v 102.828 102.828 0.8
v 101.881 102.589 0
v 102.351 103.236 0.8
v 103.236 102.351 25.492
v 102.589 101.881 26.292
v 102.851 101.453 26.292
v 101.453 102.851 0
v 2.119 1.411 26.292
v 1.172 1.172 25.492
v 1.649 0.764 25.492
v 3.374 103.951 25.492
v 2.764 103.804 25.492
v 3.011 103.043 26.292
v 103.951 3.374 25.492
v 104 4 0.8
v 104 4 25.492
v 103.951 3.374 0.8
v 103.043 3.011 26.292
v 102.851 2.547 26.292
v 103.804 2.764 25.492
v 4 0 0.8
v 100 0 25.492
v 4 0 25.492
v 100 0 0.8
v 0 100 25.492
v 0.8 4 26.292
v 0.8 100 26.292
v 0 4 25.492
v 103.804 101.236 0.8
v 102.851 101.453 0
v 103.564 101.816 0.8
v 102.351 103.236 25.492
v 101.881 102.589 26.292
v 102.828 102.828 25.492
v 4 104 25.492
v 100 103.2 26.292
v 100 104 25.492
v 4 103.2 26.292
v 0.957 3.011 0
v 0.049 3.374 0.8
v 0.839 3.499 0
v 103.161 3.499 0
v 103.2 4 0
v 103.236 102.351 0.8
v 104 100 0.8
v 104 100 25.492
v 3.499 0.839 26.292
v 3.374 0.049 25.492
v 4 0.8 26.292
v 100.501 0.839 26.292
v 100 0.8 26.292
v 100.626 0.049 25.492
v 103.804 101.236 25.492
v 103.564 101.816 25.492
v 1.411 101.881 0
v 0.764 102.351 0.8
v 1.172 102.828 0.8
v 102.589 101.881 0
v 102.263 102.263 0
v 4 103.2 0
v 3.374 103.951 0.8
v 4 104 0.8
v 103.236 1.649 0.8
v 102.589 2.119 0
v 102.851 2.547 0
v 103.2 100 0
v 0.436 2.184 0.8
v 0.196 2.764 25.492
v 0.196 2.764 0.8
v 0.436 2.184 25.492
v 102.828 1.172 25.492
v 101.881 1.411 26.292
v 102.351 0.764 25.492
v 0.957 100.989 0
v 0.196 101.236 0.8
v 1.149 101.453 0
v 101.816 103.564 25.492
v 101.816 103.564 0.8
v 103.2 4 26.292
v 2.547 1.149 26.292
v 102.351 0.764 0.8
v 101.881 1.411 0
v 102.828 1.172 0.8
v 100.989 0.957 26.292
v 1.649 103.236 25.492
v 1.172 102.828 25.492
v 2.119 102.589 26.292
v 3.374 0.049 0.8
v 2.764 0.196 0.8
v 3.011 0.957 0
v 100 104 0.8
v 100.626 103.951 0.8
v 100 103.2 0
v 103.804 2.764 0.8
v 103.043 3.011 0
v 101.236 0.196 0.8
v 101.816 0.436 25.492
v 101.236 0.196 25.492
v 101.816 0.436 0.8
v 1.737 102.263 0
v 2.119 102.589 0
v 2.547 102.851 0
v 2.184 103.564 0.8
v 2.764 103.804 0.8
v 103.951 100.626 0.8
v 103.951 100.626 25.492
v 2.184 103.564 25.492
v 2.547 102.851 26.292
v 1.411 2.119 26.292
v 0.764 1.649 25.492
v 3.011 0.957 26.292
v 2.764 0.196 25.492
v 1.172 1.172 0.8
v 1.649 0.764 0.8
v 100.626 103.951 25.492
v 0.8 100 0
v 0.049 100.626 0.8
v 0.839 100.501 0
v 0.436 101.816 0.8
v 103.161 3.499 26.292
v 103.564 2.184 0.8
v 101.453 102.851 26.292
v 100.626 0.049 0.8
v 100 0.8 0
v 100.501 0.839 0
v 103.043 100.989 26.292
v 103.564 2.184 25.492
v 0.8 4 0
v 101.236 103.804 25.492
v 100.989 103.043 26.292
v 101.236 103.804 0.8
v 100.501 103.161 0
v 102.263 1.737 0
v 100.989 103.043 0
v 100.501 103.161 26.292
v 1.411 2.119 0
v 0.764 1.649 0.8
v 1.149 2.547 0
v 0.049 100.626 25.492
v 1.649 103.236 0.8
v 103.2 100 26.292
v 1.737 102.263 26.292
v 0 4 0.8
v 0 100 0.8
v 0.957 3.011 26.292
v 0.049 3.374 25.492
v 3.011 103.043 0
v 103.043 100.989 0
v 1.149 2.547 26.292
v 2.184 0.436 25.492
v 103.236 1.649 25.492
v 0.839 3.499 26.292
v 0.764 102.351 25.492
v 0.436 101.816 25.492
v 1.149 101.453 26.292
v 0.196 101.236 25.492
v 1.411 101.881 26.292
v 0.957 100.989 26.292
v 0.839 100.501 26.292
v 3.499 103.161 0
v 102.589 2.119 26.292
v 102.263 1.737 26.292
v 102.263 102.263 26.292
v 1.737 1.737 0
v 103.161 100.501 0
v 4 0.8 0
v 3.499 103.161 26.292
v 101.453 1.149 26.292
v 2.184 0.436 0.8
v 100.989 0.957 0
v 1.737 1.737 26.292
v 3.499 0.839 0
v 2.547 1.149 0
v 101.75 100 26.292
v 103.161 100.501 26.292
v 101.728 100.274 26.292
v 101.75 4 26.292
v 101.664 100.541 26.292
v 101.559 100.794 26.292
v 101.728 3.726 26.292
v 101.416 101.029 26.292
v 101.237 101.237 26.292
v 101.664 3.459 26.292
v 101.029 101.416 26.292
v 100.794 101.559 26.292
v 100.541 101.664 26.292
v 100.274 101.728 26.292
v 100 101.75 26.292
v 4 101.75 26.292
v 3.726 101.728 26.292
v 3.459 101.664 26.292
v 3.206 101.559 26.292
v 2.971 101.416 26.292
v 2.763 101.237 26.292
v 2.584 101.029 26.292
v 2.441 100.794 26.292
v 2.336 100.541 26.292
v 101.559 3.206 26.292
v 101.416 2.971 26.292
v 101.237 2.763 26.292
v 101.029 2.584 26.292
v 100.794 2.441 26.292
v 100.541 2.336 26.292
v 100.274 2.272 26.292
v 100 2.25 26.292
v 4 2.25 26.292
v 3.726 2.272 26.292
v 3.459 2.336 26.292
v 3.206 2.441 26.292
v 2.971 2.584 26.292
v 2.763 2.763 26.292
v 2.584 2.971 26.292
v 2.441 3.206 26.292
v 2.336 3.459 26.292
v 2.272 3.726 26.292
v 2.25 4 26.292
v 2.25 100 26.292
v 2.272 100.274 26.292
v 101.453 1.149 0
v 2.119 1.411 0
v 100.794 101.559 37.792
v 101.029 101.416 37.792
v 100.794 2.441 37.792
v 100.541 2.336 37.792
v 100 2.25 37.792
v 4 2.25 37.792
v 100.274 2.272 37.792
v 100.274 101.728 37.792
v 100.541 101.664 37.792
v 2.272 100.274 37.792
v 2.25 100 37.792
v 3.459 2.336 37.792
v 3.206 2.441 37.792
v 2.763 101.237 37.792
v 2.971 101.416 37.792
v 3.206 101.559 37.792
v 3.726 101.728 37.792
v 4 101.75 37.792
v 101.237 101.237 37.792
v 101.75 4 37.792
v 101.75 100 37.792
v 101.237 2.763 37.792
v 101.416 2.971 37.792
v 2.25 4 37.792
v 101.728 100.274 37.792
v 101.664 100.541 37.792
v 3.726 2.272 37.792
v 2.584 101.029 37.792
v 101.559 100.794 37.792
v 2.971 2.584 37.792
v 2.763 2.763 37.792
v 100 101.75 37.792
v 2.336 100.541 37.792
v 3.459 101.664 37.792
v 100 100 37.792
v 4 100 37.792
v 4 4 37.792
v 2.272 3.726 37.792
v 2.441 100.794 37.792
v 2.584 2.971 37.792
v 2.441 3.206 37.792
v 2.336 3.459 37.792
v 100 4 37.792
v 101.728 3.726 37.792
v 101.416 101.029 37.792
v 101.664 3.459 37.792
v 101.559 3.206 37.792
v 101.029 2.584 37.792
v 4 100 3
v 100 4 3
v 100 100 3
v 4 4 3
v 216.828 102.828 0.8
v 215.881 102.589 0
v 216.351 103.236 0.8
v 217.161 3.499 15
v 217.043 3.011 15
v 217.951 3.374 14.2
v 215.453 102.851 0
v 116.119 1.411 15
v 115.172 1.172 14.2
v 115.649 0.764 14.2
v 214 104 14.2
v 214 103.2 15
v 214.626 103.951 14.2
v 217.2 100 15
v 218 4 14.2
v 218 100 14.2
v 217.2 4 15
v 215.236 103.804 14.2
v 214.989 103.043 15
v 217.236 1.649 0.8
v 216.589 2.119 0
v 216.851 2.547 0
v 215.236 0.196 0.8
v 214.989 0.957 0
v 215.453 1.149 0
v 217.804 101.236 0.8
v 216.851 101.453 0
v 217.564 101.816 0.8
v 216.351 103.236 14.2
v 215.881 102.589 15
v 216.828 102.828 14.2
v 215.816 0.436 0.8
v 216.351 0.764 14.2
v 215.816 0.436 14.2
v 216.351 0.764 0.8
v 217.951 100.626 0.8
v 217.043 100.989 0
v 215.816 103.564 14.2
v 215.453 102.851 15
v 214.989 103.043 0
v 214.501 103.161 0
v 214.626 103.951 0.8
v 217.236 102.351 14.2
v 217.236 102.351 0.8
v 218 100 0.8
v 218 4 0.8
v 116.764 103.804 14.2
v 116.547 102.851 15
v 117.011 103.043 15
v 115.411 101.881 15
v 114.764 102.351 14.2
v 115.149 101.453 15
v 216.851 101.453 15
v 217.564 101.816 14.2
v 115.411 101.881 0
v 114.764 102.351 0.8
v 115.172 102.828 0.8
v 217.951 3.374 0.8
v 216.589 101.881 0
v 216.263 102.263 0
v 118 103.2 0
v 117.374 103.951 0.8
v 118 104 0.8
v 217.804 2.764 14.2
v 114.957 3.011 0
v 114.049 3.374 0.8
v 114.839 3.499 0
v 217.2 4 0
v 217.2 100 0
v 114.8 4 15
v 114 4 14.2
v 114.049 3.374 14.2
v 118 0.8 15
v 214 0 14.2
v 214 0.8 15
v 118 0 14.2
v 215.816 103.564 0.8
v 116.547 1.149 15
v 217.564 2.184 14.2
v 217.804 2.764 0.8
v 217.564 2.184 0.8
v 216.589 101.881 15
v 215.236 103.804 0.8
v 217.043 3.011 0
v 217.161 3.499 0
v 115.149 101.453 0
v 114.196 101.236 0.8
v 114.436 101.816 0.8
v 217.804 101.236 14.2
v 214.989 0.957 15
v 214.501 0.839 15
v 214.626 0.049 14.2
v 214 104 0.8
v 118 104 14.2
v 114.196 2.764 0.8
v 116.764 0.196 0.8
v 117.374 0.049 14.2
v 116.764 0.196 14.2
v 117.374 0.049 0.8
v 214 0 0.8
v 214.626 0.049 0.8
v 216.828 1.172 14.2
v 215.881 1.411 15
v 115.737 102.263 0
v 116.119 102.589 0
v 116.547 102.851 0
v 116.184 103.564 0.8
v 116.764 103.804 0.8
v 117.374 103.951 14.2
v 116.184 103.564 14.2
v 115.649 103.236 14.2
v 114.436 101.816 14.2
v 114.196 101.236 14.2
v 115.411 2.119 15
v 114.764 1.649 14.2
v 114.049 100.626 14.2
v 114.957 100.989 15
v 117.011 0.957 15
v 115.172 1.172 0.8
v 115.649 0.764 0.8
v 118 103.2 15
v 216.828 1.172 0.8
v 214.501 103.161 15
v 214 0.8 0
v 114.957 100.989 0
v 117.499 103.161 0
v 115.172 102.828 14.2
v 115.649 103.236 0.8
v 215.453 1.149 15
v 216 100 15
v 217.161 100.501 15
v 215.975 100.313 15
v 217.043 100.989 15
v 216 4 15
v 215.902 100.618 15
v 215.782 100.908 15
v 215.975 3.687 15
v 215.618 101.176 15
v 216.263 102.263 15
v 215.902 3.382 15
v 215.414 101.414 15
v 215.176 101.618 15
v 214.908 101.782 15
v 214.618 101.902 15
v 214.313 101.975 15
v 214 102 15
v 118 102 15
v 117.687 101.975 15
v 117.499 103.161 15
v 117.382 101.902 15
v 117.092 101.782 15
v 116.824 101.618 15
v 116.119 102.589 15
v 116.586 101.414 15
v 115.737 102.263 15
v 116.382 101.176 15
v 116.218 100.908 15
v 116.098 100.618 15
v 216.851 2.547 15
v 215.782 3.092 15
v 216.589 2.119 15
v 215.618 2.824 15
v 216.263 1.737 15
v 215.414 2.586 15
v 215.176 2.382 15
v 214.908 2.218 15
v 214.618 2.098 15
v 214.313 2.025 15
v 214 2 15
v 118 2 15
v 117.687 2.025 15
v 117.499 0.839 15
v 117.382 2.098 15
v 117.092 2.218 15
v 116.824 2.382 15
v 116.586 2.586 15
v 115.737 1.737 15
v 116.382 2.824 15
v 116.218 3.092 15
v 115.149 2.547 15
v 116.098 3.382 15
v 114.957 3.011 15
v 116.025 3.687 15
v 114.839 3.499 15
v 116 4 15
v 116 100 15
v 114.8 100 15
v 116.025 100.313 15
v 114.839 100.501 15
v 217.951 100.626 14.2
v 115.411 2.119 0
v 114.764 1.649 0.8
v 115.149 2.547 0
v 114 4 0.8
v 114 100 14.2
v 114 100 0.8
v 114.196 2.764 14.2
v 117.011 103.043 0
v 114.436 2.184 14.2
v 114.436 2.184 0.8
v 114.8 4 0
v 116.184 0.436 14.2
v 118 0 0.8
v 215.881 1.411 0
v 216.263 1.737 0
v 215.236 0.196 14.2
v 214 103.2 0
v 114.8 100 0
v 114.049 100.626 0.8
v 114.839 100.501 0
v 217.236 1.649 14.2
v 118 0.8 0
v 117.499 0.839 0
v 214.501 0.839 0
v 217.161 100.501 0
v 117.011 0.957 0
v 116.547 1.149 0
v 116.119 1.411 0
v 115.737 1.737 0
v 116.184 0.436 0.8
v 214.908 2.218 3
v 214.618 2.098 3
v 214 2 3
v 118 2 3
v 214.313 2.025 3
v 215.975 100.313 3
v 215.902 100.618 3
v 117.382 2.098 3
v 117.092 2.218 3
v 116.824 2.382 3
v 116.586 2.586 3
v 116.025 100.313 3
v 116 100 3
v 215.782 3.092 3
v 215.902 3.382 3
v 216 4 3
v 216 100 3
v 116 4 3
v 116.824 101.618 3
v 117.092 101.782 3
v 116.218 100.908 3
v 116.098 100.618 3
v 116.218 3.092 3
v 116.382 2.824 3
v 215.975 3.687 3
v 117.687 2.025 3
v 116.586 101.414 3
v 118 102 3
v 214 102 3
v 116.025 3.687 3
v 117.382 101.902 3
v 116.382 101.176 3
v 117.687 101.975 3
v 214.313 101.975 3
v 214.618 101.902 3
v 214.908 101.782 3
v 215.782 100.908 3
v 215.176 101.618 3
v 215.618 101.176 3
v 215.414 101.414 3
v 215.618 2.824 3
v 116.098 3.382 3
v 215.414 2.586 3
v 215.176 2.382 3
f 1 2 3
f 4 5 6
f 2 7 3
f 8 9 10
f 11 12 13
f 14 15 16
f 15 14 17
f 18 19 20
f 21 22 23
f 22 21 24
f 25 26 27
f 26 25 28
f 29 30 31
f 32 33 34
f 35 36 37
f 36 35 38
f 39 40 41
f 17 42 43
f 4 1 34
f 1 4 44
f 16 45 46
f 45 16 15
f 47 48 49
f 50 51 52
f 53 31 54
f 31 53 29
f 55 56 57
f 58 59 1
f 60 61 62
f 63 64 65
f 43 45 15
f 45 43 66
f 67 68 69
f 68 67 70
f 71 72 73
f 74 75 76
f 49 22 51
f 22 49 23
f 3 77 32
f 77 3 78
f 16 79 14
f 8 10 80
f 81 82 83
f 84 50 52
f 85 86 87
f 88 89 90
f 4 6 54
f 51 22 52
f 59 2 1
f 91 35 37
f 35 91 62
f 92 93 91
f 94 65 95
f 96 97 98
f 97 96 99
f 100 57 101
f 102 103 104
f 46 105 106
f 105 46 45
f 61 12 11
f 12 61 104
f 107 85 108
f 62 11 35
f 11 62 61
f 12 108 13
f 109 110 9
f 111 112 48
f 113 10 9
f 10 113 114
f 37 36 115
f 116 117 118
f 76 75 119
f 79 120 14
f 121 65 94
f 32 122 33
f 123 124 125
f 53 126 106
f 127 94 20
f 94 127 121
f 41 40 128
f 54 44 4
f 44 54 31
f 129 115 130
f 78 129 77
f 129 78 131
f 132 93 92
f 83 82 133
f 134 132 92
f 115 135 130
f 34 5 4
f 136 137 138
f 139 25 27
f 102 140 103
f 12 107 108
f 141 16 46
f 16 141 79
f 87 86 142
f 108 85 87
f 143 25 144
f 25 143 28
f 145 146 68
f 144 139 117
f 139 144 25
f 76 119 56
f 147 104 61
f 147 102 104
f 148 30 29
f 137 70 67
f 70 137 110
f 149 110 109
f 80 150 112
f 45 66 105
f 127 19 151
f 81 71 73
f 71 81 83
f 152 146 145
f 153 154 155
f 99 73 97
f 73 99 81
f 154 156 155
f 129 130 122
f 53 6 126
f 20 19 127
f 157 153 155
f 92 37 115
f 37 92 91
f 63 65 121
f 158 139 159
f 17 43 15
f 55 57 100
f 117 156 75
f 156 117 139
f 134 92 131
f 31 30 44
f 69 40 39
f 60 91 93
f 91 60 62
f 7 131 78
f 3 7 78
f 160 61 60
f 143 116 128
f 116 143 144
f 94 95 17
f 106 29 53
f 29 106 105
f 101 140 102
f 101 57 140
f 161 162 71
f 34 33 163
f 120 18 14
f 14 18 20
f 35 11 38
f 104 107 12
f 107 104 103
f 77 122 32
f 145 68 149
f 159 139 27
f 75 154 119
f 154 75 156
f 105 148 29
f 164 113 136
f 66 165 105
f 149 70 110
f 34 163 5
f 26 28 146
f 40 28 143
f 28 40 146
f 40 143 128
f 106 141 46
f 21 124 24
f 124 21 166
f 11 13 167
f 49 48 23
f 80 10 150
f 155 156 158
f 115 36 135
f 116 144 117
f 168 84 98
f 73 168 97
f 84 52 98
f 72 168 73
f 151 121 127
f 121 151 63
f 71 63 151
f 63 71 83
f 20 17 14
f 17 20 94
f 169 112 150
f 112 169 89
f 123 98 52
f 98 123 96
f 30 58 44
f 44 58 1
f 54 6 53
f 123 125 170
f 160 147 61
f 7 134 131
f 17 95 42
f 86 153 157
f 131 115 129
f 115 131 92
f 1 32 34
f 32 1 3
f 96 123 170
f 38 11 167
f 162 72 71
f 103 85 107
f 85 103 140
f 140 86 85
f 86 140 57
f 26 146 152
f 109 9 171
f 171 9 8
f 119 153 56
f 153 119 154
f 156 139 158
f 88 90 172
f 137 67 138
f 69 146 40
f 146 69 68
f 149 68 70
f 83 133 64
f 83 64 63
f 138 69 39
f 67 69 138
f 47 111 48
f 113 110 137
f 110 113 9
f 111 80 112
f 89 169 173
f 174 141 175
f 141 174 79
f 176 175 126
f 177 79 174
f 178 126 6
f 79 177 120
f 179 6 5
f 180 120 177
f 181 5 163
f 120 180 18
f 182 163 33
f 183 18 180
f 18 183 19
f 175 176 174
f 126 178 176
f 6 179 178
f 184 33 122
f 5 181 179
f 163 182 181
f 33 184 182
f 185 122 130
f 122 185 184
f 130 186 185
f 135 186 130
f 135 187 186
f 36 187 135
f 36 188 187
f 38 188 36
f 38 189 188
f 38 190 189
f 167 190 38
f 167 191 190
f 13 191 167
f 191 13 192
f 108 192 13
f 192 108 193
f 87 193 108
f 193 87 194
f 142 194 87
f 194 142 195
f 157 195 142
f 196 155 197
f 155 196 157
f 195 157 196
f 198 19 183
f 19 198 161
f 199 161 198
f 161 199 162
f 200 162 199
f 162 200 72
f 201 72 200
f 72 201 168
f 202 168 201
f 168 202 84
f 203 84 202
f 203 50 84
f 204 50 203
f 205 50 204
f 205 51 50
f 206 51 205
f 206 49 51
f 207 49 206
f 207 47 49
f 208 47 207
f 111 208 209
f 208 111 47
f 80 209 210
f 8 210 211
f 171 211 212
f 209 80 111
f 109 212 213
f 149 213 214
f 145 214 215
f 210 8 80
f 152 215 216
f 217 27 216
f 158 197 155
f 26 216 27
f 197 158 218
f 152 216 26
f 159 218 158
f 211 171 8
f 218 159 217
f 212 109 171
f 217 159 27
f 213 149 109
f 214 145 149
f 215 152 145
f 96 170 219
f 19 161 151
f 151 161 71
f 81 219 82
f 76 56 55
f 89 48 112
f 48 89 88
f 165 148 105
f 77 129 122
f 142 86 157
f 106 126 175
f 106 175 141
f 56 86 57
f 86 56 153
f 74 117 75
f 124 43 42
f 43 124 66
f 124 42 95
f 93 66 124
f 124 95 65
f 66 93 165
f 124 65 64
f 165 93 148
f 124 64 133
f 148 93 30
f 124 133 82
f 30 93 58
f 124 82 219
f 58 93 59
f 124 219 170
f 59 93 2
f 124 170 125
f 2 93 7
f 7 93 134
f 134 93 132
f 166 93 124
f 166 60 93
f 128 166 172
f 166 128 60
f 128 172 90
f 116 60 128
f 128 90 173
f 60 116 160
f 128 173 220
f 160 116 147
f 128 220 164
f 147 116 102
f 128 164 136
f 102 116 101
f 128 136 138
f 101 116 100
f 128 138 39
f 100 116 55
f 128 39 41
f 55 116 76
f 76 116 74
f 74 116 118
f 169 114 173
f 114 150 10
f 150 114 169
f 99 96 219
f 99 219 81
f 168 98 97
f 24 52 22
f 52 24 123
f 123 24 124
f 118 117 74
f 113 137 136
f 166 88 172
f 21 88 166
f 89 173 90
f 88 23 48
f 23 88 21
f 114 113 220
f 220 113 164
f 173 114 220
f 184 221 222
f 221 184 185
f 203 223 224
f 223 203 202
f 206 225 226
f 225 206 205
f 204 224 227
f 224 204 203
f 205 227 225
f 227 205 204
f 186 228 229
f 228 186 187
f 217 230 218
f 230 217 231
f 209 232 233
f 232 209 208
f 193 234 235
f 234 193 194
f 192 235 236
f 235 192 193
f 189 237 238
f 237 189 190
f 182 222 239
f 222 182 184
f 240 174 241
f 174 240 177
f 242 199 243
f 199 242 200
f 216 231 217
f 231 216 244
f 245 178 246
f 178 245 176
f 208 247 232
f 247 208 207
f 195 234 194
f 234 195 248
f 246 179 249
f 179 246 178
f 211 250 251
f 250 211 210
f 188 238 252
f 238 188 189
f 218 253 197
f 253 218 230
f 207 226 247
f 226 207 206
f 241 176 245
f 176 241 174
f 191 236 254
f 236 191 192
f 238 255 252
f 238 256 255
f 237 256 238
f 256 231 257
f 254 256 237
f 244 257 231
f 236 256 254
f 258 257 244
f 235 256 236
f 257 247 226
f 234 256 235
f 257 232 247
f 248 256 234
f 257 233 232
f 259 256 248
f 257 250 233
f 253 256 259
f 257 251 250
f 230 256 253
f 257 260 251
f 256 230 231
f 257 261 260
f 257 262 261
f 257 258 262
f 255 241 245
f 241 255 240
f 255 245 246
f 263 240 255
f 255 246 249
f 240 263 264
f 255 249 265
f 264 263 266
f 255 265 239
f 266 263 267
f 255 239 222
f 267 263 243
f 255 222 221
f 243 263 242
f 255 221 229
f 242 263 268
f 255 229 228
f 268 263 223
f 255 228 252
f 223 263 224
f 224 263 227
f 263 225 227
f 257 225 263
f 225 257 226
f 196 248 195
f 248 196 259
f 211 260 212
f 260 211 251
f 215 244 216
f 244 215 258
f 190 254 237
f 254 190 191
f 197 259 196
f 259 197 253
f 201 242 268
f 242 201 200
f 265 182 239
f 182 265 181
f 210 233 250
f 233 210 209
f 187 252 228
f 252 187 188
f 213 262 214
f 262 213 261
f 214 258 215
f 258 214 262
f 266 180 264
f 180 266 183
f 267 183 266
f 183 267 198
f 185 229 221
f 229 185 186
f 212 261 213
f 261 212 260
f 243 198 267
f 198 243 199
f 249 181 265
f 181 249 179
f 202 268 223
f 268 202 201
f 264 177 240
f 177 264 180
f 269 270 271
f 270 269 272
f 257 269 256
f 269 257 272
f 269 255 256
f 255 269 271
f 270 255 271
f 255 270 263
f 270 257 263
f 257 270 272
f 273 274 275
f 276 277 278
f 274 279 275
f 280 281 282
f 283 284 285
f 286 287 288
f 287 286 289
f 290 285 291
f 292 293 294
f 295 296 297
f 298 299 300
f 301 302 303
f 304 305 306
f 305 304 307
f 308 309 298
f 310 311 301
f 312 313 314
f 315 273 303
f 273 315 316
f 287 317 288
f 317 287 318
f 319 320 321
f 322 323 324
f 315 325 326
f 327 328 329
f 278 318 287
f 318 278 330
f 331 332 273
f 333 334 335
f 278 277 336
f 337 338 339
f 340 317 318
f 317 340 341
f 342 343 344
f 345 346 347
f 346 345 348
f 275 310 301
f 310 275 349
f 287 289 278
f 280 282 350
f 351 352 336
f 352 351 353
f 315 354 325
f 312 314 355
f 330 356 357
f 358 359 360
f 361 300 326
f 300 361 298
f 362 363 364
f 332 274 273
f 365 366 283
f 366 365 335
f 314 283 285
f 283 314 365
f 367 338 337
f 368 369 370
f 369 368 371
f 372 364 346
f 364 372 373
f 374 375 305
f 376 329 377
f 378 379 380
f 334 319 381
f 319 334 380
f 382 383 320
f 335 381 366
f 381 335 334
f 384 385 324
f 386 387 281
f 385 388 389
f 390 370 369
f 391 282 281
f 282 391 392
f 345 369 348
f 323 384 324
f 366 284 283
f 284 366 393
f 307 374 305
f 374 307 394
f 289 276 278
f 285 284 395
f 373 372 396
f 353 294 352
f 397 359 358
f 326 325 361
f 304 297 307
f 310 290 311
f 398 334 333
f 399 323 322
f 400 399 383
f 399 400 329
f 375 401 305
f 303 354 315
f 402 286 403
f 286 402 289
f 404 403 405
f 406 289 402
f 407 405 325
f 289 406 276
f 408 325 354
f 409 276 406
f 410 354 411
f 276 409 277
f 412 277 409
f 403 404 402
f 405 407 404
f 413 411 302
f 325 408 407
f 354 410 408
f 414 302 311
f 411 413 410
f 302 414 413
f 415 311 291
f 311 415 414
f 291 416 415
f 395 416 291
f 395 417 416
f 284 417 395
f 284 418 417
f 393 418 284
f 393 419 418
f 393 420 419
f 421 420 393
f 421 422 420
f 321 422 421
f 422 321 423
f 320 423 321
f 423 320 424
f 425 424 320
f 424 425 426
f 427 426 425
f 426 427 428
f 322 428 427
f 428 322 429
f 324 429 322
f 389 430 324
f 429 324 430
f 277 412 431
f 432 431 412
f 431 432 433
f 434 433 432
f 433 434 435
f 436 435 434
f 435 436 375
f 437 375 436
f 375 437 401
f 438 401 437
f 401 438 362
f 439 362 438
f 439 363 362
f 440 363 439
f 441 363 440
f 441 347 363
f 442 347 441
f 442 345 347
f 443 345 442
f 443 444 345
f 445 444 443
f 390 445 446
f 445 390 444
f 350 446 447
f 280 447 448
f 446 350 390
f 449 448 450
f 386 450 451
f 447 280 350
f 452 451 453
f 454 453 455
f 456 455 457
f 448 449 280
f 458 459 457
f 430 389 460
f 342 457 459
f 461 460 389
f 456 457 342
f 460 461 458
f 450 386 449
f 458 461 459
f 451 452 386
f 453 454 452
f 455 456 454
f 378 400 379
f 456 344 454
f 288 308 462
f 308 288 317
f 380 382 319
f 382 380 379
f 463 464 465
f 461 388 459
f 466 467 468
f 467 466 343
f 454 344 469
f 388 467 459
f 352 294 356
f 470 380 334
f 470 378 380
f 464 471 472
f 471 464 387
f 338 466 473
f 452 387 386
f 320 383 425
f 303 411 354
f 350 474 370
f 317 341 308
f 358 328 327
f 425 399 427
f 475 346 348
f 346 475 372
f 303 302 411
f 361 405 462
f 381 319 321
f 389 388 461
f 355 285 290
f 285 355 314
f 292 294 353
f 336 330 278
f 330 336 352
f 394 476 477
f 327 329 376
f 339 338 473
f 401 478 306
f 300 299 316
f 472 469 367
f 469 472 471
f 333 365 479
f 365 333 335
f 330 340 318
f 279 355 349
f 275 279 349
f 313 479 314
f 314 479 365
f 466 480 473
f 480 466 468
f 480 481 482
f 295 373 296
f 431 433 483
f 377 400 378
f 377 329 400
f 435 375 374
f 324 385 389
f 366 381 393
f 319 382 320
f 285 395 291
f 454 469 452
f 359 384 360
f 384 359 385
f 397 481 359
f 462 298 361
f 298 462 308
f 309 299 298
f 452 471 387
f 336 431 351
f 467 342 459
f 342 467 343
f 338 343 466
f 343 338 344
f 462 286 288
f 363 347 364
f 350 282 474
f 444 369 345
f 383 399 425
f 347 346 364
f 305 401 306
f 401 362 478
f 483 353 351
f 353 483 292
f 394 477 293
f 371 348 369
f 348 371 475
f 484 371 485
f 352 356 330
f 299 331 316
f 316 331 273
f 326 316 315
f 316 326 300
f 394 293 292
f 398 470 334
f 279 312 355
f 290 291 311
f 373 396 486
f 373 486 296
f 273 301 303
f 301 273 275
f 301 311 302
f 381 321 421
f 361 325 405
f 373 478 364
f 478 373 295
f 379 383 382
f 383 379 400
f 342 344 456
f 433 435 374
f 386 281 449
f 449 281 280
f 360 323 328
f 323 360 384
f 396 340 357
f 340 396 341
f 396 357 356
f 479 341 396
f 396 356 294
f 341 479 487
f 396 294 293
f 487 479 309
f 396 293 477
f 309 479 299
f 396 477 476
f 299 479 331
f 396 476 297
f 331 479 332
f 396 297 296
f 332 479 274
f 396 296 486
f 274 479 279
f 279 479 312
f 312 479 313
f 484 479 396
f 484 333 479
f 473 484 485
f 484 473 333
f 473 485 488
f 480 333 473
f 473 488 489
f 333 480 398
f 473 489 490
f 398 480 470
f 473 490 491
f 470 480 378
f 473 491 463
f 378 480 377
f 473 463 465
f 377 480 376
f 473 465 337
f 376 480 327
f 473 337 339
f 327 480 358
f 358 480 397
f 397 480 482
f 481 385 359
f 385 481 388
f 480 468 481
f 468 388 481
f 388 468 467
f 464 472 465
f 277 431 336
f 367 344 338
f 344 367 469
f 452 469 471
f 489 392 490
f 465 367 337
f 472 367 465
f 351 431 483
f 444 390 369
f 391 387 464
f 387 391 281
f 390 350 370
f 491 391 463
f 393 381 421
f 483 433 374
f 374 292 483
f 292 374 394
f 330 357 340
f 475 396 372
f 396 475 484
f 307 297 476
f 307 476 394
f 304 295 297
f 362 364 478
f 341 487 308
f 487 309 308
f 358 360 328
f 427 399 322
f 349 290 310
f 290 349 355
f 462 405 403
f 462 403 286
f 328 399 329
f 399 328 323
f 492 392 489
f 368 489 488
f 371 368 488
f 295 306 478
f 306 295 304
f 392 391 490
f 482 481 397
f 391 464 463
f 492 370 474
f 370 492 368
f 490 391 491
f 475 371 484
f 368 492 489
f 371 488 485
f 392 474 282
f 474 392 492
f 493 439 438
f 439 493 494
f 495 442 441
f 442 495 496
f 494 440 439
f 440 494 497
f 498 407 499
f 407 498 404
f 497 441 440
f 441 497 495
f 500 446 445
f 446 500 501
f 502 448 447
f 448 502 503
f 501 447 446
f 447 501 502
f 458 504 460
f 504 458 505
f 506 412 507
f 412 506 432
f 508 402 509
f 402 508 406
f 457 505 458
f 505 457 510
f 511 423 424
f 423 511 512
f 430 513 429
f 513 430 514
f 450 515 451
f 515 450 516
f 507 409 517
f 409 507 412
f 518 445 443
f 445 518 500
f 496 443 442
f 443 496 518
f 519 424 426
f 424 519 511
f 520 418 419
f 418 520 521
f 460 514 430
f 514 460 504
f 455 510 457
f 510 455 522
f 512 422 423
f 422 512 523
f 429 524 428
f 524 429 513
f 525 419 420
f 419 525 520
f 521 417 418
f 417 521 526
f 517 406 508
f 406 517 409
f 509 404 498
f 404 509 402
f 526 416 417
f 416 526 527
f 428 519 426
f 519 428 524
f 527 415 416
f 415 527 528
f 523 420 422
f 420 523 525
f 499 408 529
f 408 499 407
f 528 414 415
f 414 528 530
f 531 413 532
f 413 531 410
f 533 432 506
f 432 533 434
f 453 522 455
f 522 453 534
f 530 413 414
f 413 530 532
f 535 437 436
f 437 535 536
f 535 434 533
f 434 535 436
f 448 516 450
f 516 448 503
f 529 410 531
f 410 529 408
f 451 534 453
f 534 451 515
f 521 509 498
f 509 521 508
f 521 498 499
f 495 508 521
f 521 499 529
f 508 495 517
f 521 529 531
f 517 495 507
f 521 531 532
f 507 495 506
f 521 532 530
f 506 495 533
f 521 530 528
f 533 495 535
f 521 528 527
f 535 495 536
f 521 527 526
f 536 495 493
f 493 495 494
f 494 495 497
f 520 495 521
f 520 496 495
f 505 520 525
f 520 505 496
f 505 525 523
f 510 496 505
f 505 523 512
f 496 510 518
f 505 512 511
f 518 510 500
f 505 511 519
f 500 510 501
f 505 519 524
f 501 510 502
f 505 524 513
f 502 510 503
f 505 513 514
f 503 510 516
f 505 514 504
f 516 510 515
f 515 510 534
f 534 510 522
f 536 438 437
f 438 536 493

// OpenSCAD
// file: ../lib/maker_mark.scad
// SPDX-License-Identifier: MIT
// Copyright (c) 2026 KomaSCAD contributors. https://github.com/Kazutadashi/koma-scad
//
// The maker's mark (銘) of the ban, komadai and komabako. Include this file:
//     include <../lib/maker_mark.scad>
// A mark is up to three parts, stacked and centered: an emblem (a koma with a
// character on it), a main line, and a smaller second line. Each line can
// have wide letter spacing, as in a wordmark.
//
// Sizes: size_1 is the main line's text size and size_2 the second line's,
// in mm. maker_mark_sizes() picks them: as large as the room allows, with no
// text below a printable minimum (min_size).

// The emblem's proportions: a koma 1.6 times the main text size tall, as
// wide as a shogi king is for its length.
mark_emblem_height = 1.6;      // times the main text size
mark_emblem_aspect = 0.89;     // width / height
mark_emblem_shoulder = 0.72;   // the shoulders, as a fraction of the height
mark_emblem_inset = 0.37;      // the half-width at the shoulders, as a fraction of the height
mark_emblem_character = 0.5;   // the character's size, as a fraction of the emblem's height
mark_line_gap = 0.55;          // space between the parts, times the main text size
mark_fill = 0.8;               // an automatic mark uses at most this much of its room

// The approximate width of one character, in text sizes. Text has no
// measured width in OpenSCAD 2021, so the mark's size is planned from these.
// OpenSCAD's text size is about the height of a capital, so a character is
// wider than its size: measured in Shippori Mincho and Kaisei Tokumin, a
// Japanese character (from U+2E80) is about 1.35 wide and 1.3 tall, a Latin
// capital about 1 wide (up to 1.2), lower case 0.75, a space 0.35.
function mark_character_width(character) =
    let(code = ord(character))
    code >= 11904 ? 1.35
    : character == " " ? 0.35
    : code >= 65 && code <= 90 ? 1
    : code >= 97 && code <= 122 ? 0.75
    : 0.5;
function mark_text_width(line, i=0) = i >= len(line) ? 0 : mark_character_width(line[i]) + mark_text_width(line, i + 1);
function maker_mark_has_kanji(line) = len([for (character = line) if (ord(character) >= 11904) 1]) > 0;
// The height of a line, in text sizes: taller with Japanese characters.
function mark_line_height(line) = maker_mark_has_kanji(line) ? 1.35 : 1.1;

// The emblem's height: 1.6 times the main text size, but tall enough that its
// character is at least min_size.
function mark_emblem_size(size_1, min_size) = max(size_1*mark_emblem_height, min_size/mark_emblem_character);

// A koma outline, its heel on y = 0 and centered on x = 0.
module mark_koma_2d(height) {
    half = height*mark_emblem_aspect/2;
    polygon([[-half, 0], [half, 0], [height*mark_emblem_inset, height*mark_emblem_shoulder],
             [0, height], [-height*mark_emblem_inset, height*mark_emblem_shoulder]]);
}

// The 2D mark, centered on the origin at the middle of the main line's
// baseline. Empty lines are left out. stroke thickens every stroke by that
// much on each side, so that thin strokes print. min_size keeps the emblem's
// character at least that size.
module maker_mark_2d(line_1, line_2, size_1, size_2, font_1, font_2, spacing_1=1, spacing_2=1,
                     emblem=false, emblem_character="", emblem_font="", stroke=0, min_size=0) {
    gap = size_1*mark_line_gap;
    if (line_1 != "")
        offset(delta=stroke)
            text(line_1, size=size_1, font=font_1, spacing=spacing_1, halign="center", valign="baseline");
    if (line_2 != "")
        translate([0, -gap]) offset(delta=stroke)
            text(line_2, size=size_2, font=font_2, spacing=spacing_2, halign="center", valign="top");
    if (emblem) {
        height = mark_emblem_size(size_1, min_size);
        // The main line's capitals stand about one text size above the baseline.
        translate([0, size_1 + gap]) difference() {
            mark_koma_2d(height);
            if (emblem_character != "")
                translate([0, height*0.42]) offset(delta=stroke)
                    text(emblem_character, size=height*mark_emblem_character,
                         font=emblem_font == "" ? font_1 : emblem_font, halign="center", valign="center");
        }
    }
}

// The space above and below the main line's baseline. Letters stand about
// 1.1 sizes above it and reach about 0.2 below.
function mark_above(size_1, emblem, min_size=0) =
    size_1*1.1 + (emblem ? size_1*mark_line_gap + mark_emblem_size(size_1, min_size) : 0);
function mark_below(line_2, size_1, size_2) =
    size_1*0.2 + (line_2 == "" ? 0 : size_1*mark_line_gap + size_2*mark_line_height(line_2));

// The same mark, with its whole height centered on the origin.
module maker_mark_centered_2d(line_1, line_2, size_1, size_2, font_1, font_2, spacing_1=1, spacing_2=1,
                              emblem=false, emblem_character="", emblem_font="", stroke=0, min_size=0) {
    translate([0, (mark_below(line_2, size_1, size_2) - mark_above(size_1, emblem, min_size))/2])
        maker_mark_2d(line_1, line_2, size_1, size_2, font_1, font_2, spacing_1, spacing_2,
                      emblem, emblem_character, emblem_font, stroke, min_size);
}

// The mark's approximate [width, height] in mm, for fit checks.
function maker_mark_extent(line_1, line_2, size_1, size_2, spacing_1=1, spacing_2=1, emblem=false, min_size=0) =
    [max(mark_text_width(line_1)*size_1*spacing_1, mark_text_width(line_2)*size_2*spacing_2,
         emblem ? mark_emblem_size(size_1, min_size)*mark_emblem_aspect : 0),
     mark_above(size_1, emblem, min_size) + mark_below(line_2, size_1, size_2)];

// The text sizes [size_1, size_2] of a mark. size > 0 sets the main line;
// size = 0 makes it as large as fits mark_fill of room ([width, depth]), up to
// max_size. The second line is ratio times the main line, but never smaller
// than min_size.
function maker_mark_sizes(line_1, line_2, size, ratio, min_size, max_size, spacing_1, spacing_2, emblem, room) =
    let(width_1 = mark_text_width(line_1)*spacing_1,
        width_2 = mark_text_width(line_2)*spacing_2*ratio,
        height = 1.3 + (emblem ? mark_line_gap + mark_emblem_height : 0)
                 + (line_2 == "" ? 0 : mark_line_gap + ratio*mark_line_height(line_2)),
        by_width = room[0]*mark_fill/max(width_1, width_2, emblem ? mark_emblem_height*mark_emblem_aspect : 0, 0.01),
        by_height = room[1]*mark_fill/height,
        size_1 = size > 0 ? size : min(max_size, by_width, by_height),
        size_2 = max(size_1*ratio, min_size))
    [size_1, size_2];

// The size of the smallest text in the lines, or a large number when both are
// empty. The emblem's character grows to min_size by itself.
function maker_mark_smallest_text(line_1, line_2, sizes) =
    min(concat(line_1 != "" ? [sizes[0]] : [], line_2 != "" ? [sizes[1]] : [], [1000]));
// file: ../lib/shapes.scad
// SPDX-License-Identifier: MIT
// Copyright (c) 2026 KomaSCAD contributors. https://github.com/Kazutadashi/koma-scad
//
// Rounded slabs and rings for the ban, komadai and komabako. Include this file:
//     include <../lib/shapes.scad>
// Every shape starts at the origin and grows into +x, +y and +z.

// A rectangle with rounded corners. The radius is limited to half the shorter side.
module rounded_rectangle_2d(size, radius) {
    assert(min(size) > 0, "A rounded rectangle needs a positive width and depth.");
    assert(radius >= 0, "A corner radius cannot be negative.");
    corner = min(radius, min(size)/2);
    if (corner == 0) square(size);
    else translate([corner, corner]) offset(r=corner) square([size[0] - 2*corner, size[1] - 2*corner]);
}

// A slab with rounded vertical corners. size is [width, depth, height].
module rounded_slab(size, radius) {
    assert(size[2] > 0, "A rounded slab needs a positive height.");
    linear_extrude(size[2]) rounded_rectangle_2d([size[0], size[1]], radius);
}

// A rounded slab with a 45 degree chamfer (面取り) round its bottom and top
// edges. A chamfer prints without supports on the bed side of a part.
module chamfered_slab(size, radius, bottom=0, top=0) {
    assert(bottom + top < size[2], "The chamfers are taller than the slab.");
    module layer(z, inset, height) {
        translate([inset, inset, z])
            rounded_slab([size[0] - 2*inset, size[1] - 2*inset, height], max(0, radius - inset));
    }
    thin = 0.01;
    hull() {
        layer(0, bottom, thin);
        layer(bottom, 0, size[2] - bottom - top);
        layer(size[2] - thin, top, thin);
    }
}

// The band between a rounded rectangle and the same shape wall mm smaller on each side.
module rounded_ring_2d(size, wall, radius) {
    assert(wall > 0 && 2*wall < min(size), "The ring wall does not fit inside the ring.");
    difference() {
        rounded_rectangle_2d(size, radius);
        translate([wall, wall]) rounded_rectangle_2d([size[0] - 2*wall, size[1] - 2*wall], max(0, radius - wall));
    }
}
// file: ../lib/filaments.scad
// SPDX-License-Identifier: MIT
// Copyright (c) 2026 KomaSCAD contributors. https://github.com/Kazutadashi/koma-scad
//
// The named filaments of every module. Include this file:
//     include <../lib/filaments.scad>
// A Customizer list of filaments must name these entries, and can add Custom.

// [name, [red, green, blue, opacity]], each channel from 0 to 1.
filament_palette = [
    ["Wood", [0.76, 0.58, 0.34, 1]],   ["Black", [0.08, 0.06, 0.04, 1]],
    ["White", [0.95, 0.95, 0.95, 1]],  ["Red", [0.65, 0.05, 0.04, 1]],
    ["Blue", [0.08, 0.25, 0.8, 1]],    ["Green", [0.08, 0.5, 0.2, 1]],
    ["Purple", [0.45, 0.15, 0.65, 1]], ["Yellow", [0.95, 0.8, 0.08, 1]],
    ["Orange", [0.95, 0.35, 0.05, 1]], ["Silver", [0.7, 0.72, 0.75, 1]],
    ["Gold", [0.8, 0.62, 0.2, 1]],     ["Glitter silver", [0.7, 0.72, 0.75, 1]],
    ["Glitter gold", [0.8, 0.62, 0.2, 1]],
    ["Filament 1", [0.5, 0.5, 0.5, 1]], ["Filament 2", [0.15, 0.5, 0.85, 1]], ["Filament 3", [0.85, 0.25, 0.5, 1]],
    // The colors of the traditional woods: kaya (榧) for boards and komadai, island
    // mulberry (桑) and black persimmon (黒柿) for boxes. Colors only: no grain.
    ["Kaya", [0.86, 0.72, 0.47, 1]],   ["Kuwa", [0.66, 0.45, 0.23, 1]],
    ["Kurogaki", [0.23, 0.18, 0.14, 1]]
];

// The color of a named filament. Custom gives custom_rgba.
function filament_rgba(name, custom_rgba) =
    let(found = [for (entry = filament_palette) if (entry[0] == name) entry[1]])
    name == "Custom" ? custom_rgba
    : assert(len(found) == 1, str("Unknown filament: ", name)) found[0];
// main file
// SPDX-License-Identifier: MIT
// Copyright (c) 2026 KomaSCAD contributors. https://github.com/Kazutadashi/koma-scad
//
// KomaSCAD komabako: a box with a lid for a set of pieces. Tested with OpenSCAD 2021.01.
// The default settings make an inro-lid box for the 40 pieces of a shogi set.
// Units are mm unless a comment says otherwise.
// Guide and every setting: docs/komabako.md.
// Keep ../lib/ next to this file's folder.

/* [01 - Start here] */
// Box and Lid are one part each. Box and lid puts both on one bed. Closed shows the lid in place (F5 only).
Output_Mode = "Box and lid"; // [Box and lid,Box,Lid,Closed]
// Inro: the lid sits on a step, and its sides are flush with the box (印籠). Cap: the lid fits over the outside of the box.
Lid_Style = "Inro"; // [Inro,Cap]

/* [02 - Pieces] */
// How many pieces the box holds.
Piece_Count = 40; // [1:1:500]
// mm. Length of the largest piece, from the heel to the point.
Piece_Length = 32; // [10:0.1:100]
// mm. Width of the largest piece at the heel.
Base_Width = 28.5; // [10:0.1:100]
// mm. Thickness of the largest piece at the heel.
Rear_Thickness = 9.8; // [3:0.1:30]

/* [03 - Inside size] */
// How many pieces lie flat in one layer. The automatic height counts the layers.
Pieces_Per_Layer = 10; // [1:1:100]
// Fraction of a piece's thickness that one loose layer adds. Below 1 because loose pieces nest.
Packing_Factor = 0.76; // [0.5:0.01:1.2]
// mm. Space above the top layer.
Headroom = 5; // [1:0.5:20]
// mm. Inside width. 0 = automatic, from the largest piece.
Inner_Width = 0; // [0:1:400]
// mm. Inside depth. 0 = automatic, from the largest piece.
Inner_Depth = 0; // [0:1:400]
// mm. Inside height, from the floor to the top of the box. 0 = automatic, from the layers.
Inner_Height = 0; // [0:1:300]

/* [04 - Box] */
// mm. Thickness of the side walls. An Inro lid takes part of it for its step.
Wall_Thickness = 4; // [1.2:0.2:10]
// mm. Thickness of the bottom.
Bottom_Thickness = 3; // [1.2:0.2:8]
// mm. Radius of the outside corners (隅丸).
Corner_Radius = 4; // [0:0.5:15]
// mm. 45 degree chamfer (面取り) on the outside edges of the box and the lid.
Edge_Chamfer = 0.8; // [0:0.1:3]

/* [05 - Lid] */
// mm. Space on each side between the box and the lid. Raise it if the lid is tight.
Lid_Clearance = 0.25; // [0.05:0.05:1]
// mm. Thickness of the lid walls.
Lid_Skirt_Thickness = 2; // [1.2:0.2:6]
// mm. How far the lid walls come down the box.
Lid_Skirt_Height = 12; // [3:0.5:30]
// mm. Thickness of the lid top.
Lid_Roof_Thickness = 3; // [1.2:0.2:8]

/* [06 - Maker's mark] */
// Where the mark goes: under the box, on top of the lid, or both.
Mark_Place = "Underside"; // [Underside,Lid top,Both]
// The main line of the mark (銘), on the box: your name or brand. Empty = no mark.
Mark_Line_1 = "";
// A smaller line under it, such as SHOGI · 将棋. Empty = none.
Mark_Line_2 = "";
// mm. Text size of the main line. The second line and the emblem follow it. 0 = automatic: as large as the room allows, up to Mark Max Size.
Mark_Size = 0; // [0:0.1:40]
// mm. Automatic only: the largest text size of the main line.
Mark_Max_Size = 14; // [4:0.5:40]
// Size of the second line, as a fraction of the main line. Keep Japanese characters 3 mm or larger.
Mark_Line_2_Ratio = 0.42; // [0.2:0.01:1]
// mm. Smallest size of any text in the mark, and of the emblem's character, so that it prints. The second line and the emblem grow to it. See docs/makers-mark.md for measured values.
Mark_Min_Text_Size = 7; // [3:0.5:20]
// mm. Thickens every stroke of the mark by this much on each side, so that thin strokes print. 0.12 for a thin Mincho.
Mark_Stroke = 0; // [0:0.01:0.3]
// Letter spacing of the main line: each letter's width times this. Raise it if letters run together: a gap narrower than one printed line does not print, and the letters merge. 1.1 clears it for most fonts. About 1.7 gives a wide-spaced wordmark.
Mark_Spacing_1 = 1.1; // [0.8:0.05:3]
// Letter spacing of the second line. Raise it if letters run together.
Mark_Spacing_2 = 1.1; // [0.8:0.05:3]
// An installed font for the main line. Find its exact name in Help > Font List.
Mark_Font_1 = "Kaisei Tokumin:style=ExtraBold";
// An installed font for the second line. Use one with Japanese characters for Japanese text.
Mark_Font_2 = "Kaisei Tokumin:style=ExtraBold";
// A koma above the text, with a character cut into it.
Mark_Emblem = false;
// The character on the emblem, such as 王.
Mark_Emblem_Character = "";
// An installed font for the emblem's character, such as a brush font. Empty = Mark Font 1.
Mark_Emblem_Font = "";
// mm. Depth of the mark.
Mark_Depth = 0.4; // [0.2:0.1:1]

/* [07 - Filament colors and layout] */
// Box color. Kuwa is the island mulberry of fine boxes. Custom uses Box Color.
Box_Filament = "Kuwa"; // [Kuwa,Kurogaki,Kaya,Wood,Black,White,Red,Blue,Green,Purple,Yellow,Orange,Silver,Gold,Glitter silver,Glitter gold,Filament 1,Filament 2,Filament 3,Custom]
// Lid color. Custom uses Lid Color.
Lid_Filament = "Kuwa"; // [Kuwa,Kurogaki,Kaya,Wood,Black,White,Red,Blue,Green,Purple,Yellow,Orange,Silver,Gold,Glitter silver,Glitter gold,Filament 1,Filament 2,Filament 3,Custom]
// [red, green, blue, opacity], 0 to 1. Used when Box Filament is Custom.
Box_Color = [0.48, 0.23, 0.11, 1];
// [red, green, blue, opacity], 0 to 1. Used when Lid Filament is Custom.
Lid_Color = [0.62, 0.36, 0.17, 1];
// mm. Space between the box and the lid in Box and lid.
Print_Layout_Gap = 10; // [3:1:30]

/* [Hidden] */
version = "3.5";   // the same as VERSION in komascad.py; a test checks this
$fn = 40;
epsilon = 0.02;   // overlap that keeps boolean operations clean

include <../lib/filaments.scad>
include <../lib/shapes.scad>
include <../lib/maker_mark.scad>


// ===== 1. Sizes ===============================================================

layer_count = ceil(Piece_Count/Pieces_Per_Layer);
// The automatic floor fits about ten loose pieces side by side.
automatic_inside = max(Base_Width*3.3, Piece_Length*3);
inner_width = Inner_Width > 0 ? Inner_Width : automatic_inside;
inner_depth = Inner_Depth > 0 ? Inner_Depth : automatic_inside;
inner_height = Inner_Height > 0 ? Inner_Height : layer_count*Rear_Thickness*Packing_Factor + Headroom;
outer_width = inner_width + 2*Wall_Thickness;
outer_depth = inner_depth + 2*Wall_Thickness;
inro = Lid_Style == "Inro";

// Inro: the outer wall stops at the shoulder, and a thinner collar rises
// inside it. The lid sits on the shoulder, with its sides flush with the box.
collar_thickness = Wall_Thickness - Lid_Skirt_Thickness - Lid_Clearance;
lid_seat_gap = 0.5;   // mm between the collar top and the lid roof, so the lid rests on the shoulder
collar_height = Lid_Skirt_Height - lid_seat_gap;
box_height = Bottom_Thickness + inner_height;   // to the top of the box (the collar, for Inro)
shoulder_height = inro ? box_height - collar_height : box_height;

// The lid. Inro: the same footprint as the box. Cap: larger, around the box.
lid_opening = inro ? [outer_width, outer_depth] - 2*[Lid_Skirt_Thickness, Lid_Skirt_Thickness]
                   : [outer_width, outer_depth] + 2*[Lid_Clearance, Lid_Clearance];
lid_width = lid_opening[0] + 2*Lid_Skirt_Thickness;
lid_depth = lid_opening[1] + 2*Lid_Skirt_Thickness;
lid_height = Lid_Roof_Thickness + Lid_Skirt_Height;
lid_radius = inro ? Corner_Radius : Corner_Radius + Lid_Skirt_Thickness + Lid_Clearance;
// A cap rests its roof on the rim of the box.
closed_height = inro ? shoulder_height + lid_height : box_height + Lid_Roof_Thickness;


// The room for the mark: 3 mm in from the chamfered edges.
mark_room = [outer_width, outer_depth] - 2*[Edge_Chamfer + 3, Edge_Chamfer + 3];

// The maker's mark, from lib/maker_mark.scad: its text sizes, as large as its
// room allows, and no text below Mark Min Text Size.
mark_on = Mark_Line_1 != "" || Mark_Line_2 != "" || Mark_Emblem;
mark_sizes = maker_mark_sizes(Mark_Line_1, Mark_Line_2, Mark_Size, Mark_Line_2_Ratio, Mark_Min_Text_Size,
                              Mark_Max_Size, Mark_Spacing_1, Mark_Spacing_2, Mark_Emblem, mark_room);
mark_extent = maker_mark_extent(Mark_Line_1, Mark_Line_2, mark_sizes[0], mark_sizes[1], Mark_Spacing_1,
                                Mark_Spacing_2, Mark_Emblem, Mark_Min_Text_Size);
mark_smallest_text = maker_mark_smallest_text(Mark_Line_1, Mark_Line_2, mark_sizes);
module mark_2d() {
    maker_mark_centered_2d(Mark_Line_1, Mark_Line_2, mark_sizes[0], mark_sizes[1], Mark_Font_1, Mark_Font_2,
                           Mark_Spacing_1, Mark_Spacing_2, Mark_Emblem, Mark_Emblem_Character, Mark_Emblem_Font,
                           Mark_Stroke, Mark_Min_Text_Size);
}
mark_under = mark_on && Mark_Place != "Lid top";
mark_on_lid = mark_on && Mark_Place != "Underside";


// ===== 2. Box and lid =========================================================

// The mark on the underside, mirrored so that it reads from below.
module signature_cut() {
    if (mark_under)
        translate([outer_width/2, outer_depth/2, -epsilon]) linear_extrude(Mark_Depth + epsilon, convexity=20)
            mirror([1, 0, 0]) mark_2d();
}

// The mark on the lid top. The lid prints top down and turns over onto the
// box, so the mark is mirrored front to back, and reads from above when closed.
module lid_mark_cut() {
    if (mark_on_lid)
        translate([lid_width/2, lid_depth/2, -epsilon]) linear_extrude(Mark_Depth + epsilon, convexity=20)
            mirror([0, 1, 0]) mark_2d();
}

module box() {
    inner_radius = max(0, Corner_Radius - Wall_Thickness);
    difference() {
        union() {
            chamfered_slab([outer_width, outer_depth, shoulder_height], Corner_Radius, Edge_Chamfer, Edge_Chamfer);
            if (inro) {
                inset = Lid_Skirt_Thickness + Lid_Clearance;
                translate([inset, inset, shoulder_height - epsilon])
                    rounded_slab([outer_width - 2*inset, outer_depth - 2*inset, collar_height + epsilon],
                                 max(0, Corner_Radius - inset));
            }
        }
        translate([Wall_Thickness, Wall_Thickness, Bottom_Thickness])
            rounded_slab([inner_width, inner_depth, inner_height + epsilon], inner_radius);
        signature_cut();
    }
}

// The lid is drawn top down, so that it prints without supports.
module lid() {
    difference() {
        chamfered_slab([lid_width, lid_depth, lid_height], lid_radius, Edge_Chamfer, Edge_Chamfer);
        lid_mark_cut();
        translate([Lid_Skirt_Thickness, Lid_Skirt_Thickness, Lid_Roof_Thickness])
            rounded_slab([lid_opening[0], lid_opening[1], Lid_Skirt_Height + epsilon],
                         max(0, lid_radius - Lid_Skirt_Thickness));
    }
}

module closed_box() {
    color(filament_rgba(Box_Filament, Box_Color)) box();
    // Turn the lid over and lower it onto the box.
    lid_offset = inro ? 0 : Lid_Skirt_Thickness + Lid_Clearance;
    color(filament_rgba(Lid_Filament, Lid_Color))
        translate([-lid_offset, outer_depth + lid_offset, closed_height]) rotate([180, 0, 0]) lid();
}


// ===== 3. Checks ==============================================================

assert(inner_width > Base_Width && inner_depth > Piece_Length,
    "The inside must be larger than the largest piece. Raise Inner Width and Inner Depth, or set them to 0.");
assert(inner_height > Rear_Thickness, "The inside must be taller than the largest piece. Raise Inner Height, or set it to 0.");
assert(!inro || collar_thickness >= 1.2,
    str("The Inro step leaves a collar only ", collar_thickness, " mm thick. Raise Wall Thickness, ",
        "or reduce Lid Skirt Thickness."));
assert(!inro || shoulder_height > Bottom_Thickness + 2*Edge_Chamfer,
    "The lid comes down below the floor of the box. Reduce Lid Skirt Height.");
assert(2*Edge_Chamfer < min(Lid_Skirt_Thickness, Wall_Thickness) + Lid_Roof_Thickness,
    "Edge Chamfer is too large.");
assert(!mark_on || Mark_Depth < min(Bottom_Thickness, Lid_Roof_Thickness) - 0.6,
    "The mark is too deep for the bottom or the lid. Reduce Mark Depth.");
assert(!mark_on || (mark_extent[0] < mark_room[0] && mark_extent[1] < mark_room[1]),
    str("The maker's mark (about ", mark_extent[0], " x ", mark_extent[1], " mm) does not fit on the box (",
        mark_room[0], " x ", mark_room[1], " mm). Set Mark Size to 0 (automatic), reduce the letter spacing, or shorten the lines."));
assert(!mark_on || mark_smallest_text >= Mark_Min_Text_Size - 0.001,
    str("The maker's mark text would be ", round(mark_smallest_text*10)/10, " mm, smaller than Mark Min Text Size (",
        Mark_Min_Text_Size, " mm), and would not print. Set Mark Size to 0 (automatic) or larger, ",
        "reduce the letter spacing, or shorten the main line."));
assert(Output_Mode != "Closed" || $preview, "Closed is F5 only. Select Box, Lid, or Box and lid to export an STL.");

// Information in the Console.
if (mark_on)
    echo(str("Maker's mark: about ", round(mark_extent[0]), " x ", round(mark_extent[1]), " mm. Main line ",
             round(mark_sizes[0]*10)/10, " mm, second line ", round(mark_sizes[1]*10)/10, " mm."));
echo(str("KomaSCAD komabako ", version, ". Closed: ", outer_width, " x ", outer_depth, " x ", closed_height,
         " mm. Inside: ", inner_width, " x ", inner_depth, " x ", inner_height, " mm. Layers: ", layer_count, "."));


// ===== 4. Output ==============================================================

if (Output_Mode == "Box") color(filament_rgba(Box_Filament, Box_Color)) box();
else if (Output_Mode == "Lid") color(filament_rgba(Lid_Filament, Lid_Color)) lid();
else if (Output_Mode == "Closed") closed_box();
else {
    color(filament_rgba(Box_Filament, Box_Color)) box();
    translate([outer_width + Print_Layout_Gap, 0, 0]) color(filament_rgba(Lid_Filament, Lid_Color)) lid();
}
